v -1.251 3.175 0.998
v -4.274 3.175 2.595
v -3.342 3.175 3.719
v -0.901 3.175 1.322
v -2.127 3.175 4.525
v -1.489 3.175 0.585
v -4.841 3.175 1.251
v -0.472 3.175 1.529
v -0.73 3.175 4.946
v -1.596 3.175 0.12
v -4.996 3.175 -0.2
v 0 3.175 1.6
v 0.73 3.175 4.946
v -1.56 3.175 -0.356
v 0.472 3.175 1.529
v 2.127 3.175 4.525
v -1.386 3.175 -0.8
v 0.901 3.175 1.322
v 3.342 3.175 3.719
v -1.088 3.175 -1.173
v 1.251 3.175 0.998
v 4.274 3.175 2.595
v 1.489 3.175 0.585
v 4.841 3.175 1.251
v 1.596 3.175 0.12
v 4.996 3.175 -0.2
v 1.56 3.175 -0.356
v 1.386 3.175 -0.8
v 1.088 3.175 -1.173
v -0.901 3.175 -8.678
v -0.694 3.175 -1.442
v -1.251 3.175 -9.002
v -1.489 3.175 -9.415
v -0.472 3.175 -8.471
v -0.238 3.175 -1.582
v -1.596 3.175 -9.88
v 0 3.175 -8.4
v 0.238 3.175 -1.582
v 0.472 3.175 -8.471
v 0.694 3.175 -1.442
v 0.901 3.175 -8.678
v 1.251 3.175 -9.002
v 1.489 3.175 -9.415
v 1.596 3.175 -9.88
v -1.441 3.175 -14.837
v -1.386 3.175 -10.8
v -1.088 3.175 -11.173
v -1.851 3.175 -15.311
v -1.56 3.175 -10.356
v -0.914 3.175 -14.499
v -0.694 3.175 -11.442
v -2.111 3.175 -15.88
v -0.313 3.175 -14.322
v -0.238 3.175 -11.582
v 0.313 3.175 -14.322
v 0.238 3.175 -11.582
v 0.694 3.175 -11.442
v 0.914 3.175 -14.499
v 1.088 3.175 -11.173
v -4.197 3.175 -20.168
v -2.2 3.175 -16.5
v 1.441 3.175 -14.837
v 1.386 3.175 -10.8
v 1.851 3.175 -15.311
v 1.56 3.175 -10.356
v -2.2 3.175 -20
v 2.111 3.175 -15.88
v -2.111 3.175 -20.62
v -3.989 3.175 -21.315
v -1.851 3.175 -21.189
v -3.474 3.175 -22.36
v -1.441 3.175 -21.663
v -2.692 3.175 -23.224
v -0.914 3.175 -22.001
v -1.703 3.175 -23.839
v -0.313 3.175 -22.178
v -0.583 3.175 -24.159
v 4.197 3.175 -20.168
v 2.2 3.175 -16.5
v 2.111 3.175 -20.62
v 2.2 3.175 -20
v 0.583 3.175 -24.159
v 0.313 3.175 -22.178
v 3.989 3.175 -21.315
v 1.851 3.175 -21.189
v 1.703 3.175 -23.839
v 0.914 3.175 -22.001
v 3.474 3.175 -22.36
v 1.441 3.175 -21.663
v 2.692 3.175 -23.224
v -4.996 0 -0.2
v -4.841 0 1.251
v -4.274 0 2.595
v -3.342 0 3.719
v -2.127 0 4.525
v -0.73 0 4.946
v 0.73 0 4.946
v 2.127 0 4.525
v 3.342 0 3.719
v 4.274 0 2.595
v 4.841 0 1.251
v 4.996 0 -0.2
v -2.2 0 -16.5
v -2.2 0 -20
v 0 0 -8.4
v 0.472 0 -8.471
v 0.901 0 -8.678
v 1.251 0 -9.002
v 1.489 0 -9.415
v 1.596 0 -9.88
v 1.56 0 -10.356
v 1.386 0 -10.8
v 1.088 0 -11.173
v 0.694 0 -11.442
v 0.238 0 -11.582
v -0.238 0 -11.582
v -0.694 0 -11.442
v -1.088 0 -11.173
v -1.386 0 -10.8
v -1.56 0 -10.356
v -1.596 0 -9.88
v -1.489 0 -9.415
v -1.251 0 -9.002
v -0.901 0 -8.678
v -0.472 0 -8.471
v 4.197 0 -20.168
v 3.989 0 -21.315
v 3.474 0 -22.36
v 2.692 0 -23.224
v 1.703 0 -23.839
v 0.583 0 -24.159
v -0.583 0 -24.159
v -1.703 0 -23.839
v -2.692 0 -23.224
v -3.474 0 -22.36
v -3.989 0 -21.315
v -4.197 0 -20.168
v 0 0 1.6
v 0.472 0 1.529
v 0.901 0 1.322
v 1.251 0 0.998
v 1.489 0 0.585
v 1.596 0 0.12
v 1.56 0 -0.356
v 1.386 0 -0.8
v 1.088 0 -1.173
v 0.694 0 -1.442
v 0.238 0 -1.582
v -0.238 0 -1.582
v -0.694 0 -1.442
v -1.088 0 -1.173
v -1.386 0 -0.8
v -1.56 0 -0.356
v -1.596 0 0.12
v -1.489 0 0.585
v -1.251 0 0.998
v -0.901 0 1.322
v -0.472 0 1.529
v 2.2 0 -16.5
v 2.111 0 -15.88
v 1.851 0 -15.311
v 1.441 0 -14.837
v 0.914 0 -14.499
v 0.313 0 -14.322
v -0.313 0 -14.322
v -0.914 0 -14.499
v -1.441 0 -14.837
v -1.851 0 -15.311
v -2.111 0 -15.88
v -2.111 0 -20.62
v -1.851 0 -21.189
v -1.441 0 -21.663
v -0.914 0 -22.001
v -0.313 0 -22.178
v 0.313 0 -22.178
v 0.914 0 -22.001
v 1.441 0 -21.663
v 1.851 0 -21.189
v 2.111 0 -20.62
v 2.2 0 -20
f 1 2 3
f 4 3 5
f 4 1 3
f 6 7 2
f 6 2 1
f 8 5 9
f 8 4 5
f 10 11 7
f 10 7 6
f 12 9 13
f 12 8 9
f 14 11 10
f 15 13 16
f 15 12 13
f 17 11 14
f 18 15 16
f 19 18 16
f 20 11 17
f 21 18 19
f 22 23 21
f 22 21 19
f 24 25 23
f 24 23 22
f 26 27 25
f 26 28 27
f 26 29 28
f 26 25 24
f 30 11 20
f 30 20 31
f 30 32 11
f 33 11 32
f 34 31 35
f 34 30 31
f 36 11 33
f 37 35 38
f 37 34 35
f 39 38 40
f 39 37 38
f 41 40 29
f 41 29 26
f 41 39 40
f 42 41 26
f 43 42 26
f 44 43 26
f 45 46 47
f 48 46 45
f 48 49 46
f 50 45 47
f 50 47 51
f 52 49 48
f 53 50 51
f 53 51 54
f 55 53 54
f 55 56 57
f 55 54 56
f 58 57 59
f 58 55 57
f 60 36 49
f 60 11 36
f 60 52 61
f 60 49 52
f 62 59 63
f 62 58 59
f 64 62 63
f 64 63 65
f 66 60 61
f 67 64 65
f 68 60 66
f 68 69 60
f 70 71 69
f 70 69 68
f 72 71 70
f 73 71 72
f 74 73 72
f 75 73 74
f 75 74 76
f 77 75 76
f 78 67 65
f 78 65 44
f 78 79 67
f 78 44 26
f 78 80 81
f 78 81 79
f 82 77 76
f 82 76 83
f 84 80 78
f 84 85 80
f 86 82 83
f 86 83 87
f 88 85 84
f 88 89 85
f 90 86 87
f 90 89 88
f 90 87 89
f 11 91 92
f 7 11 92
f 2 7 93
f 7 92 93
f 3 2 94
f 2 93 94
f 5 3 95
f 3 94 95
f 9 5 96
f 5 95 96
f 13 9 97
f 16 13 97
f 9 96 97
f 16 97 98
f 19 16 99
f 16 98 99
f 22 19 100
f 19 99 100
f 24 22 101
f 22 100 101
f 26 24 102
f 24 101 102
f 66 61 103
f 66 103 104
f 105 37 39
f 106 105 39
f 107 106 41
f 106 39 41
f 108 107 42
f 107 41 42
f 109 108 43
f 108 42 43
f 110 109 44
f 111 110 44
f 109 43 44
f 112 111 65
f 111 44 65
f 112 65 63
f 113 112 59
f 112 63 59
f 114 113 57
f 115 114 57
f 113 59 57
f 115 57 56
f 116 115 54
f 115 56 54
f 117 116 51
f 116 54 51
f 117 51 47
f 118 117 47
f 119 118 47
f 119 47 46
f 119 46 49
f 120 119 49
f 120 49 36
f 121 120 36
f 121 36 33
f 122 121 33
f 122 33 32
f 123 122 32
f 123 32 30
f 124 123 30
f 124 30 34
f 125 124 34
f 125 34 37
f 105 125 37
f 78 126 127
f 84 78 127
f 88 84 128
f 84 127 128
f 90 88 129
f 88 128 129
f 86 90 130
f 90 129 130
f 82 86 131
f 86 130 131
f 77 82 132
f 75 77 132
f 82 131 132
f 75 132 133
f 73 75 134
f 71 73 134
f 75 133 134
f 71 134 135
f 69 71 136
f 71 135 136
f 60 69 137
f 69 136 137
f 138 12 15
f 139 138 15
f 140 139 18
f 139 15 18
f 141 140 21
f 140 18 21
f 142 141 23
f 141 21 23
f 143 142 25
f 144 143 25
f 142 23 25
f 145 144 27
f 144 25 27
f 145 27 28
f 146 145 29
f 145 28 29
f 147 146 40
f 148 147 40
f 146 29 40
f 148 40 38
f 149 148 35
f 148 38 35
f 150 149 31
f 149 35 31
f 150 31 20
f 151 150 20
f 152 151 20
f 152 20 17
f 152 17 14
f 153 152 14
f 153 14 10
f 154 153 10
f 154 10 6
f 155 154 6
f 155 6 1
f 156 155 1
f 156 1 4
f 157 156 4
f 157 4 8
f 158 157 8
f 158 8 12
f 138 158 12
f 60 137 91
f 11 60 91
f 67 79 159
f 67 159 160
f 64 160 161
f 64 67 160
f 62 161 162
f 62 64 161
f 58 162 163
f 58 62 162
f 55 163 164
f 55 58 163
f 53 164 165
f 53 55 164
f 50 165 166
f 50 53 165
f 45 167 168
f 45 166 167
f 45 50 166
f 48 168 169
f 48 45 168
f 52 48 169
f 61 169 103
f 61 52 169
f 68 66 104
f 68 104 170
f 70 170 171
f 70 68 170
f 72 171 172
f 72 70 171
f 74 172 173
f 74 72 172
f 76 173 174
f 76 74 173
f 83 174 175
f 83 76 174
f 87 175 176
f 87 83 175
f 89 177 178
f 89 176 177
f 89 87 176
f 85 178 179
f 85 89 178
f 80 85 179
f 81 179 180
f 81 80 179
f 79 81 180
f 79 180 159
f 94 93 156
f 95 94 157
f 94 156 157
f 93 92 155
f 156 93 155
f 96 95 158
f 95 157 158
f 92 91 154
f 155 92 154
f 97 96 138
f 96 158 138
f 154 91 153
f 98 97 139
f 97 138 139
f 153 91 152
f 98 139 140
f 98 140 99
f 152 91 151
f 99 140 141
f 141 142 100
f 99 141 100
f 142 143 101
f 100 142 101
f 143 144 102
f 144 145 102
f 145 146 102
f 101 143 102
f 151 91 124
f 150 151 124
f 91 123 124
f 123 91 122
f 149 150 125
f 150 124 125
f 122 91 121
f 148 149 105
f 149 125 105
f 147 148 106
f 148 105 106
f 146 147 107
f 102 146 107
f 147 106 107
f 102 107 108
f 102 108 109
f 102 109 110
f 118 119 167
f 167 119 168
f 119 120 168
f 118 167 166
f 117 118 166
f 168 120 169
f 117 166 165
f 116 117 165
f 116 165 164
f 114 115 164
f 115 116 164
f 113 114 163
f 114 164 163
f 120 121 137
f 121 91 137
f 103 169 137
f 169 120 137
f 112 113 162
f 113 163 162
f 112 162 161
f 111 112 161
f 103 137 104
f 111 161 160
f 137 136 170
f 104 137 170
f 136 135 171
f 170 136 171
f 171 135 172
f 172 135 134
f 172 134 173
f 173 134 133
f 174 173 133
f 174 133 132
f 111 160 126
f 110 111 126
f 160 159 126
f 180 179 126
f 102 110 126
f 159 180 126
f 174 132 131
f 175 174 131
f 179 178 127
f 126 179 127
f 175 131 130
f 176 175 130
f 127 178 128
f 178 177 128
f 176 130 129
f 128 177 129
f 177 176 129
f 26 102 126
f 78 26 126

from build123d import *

# Parameters (mm, degrees)
BOSS_EXTRUDE1_DEPTH = 3.175
SKETCH2_R           = 1.6
CUT_EXTRUDE1_DEPTH  = 25.914265492
CUT_EXTRUDE2_DEPTH  = 25.914265492


with BuildPart() as part:
    # Sketch1 → Boss-Extrude1 (new body)
    with BuildSketch(Plane(origin=(0, 0, 0), x_dir=(1, 0, 0), z_dir=(0, 1, 0))):
        with BuildLine():
            Line((-4.196638655, 20.168), (-4.995998399, 0.2))
            ThreePointArc((-4.995998399, 0.2), (0, -5), (4.995998399, 0.2))
            Line((4.995998399, 0.2), (4.196638655, 20.168))
            ThreePointArc((4.196638655, 20.168), (0, 24.2), (-4.196638655, 20.168))
        make_face()
    extrude(amount=BOSS_EXTRUDE1_DEPTH)

    # Sketch2 → Cut-Extrude1 (cut, through all)
    with BuildSketch(Plane(origin=(0, 3.175, 0), x_dir=(1, 0, 0), z_dir=(0, 1, 0))):
        with Locations(Location((0, 0, 0), (0, 0, 270))):
            Circle(SKETCH2_R)
        with Locations(Location((0, 10, 0), (0, 0, 270))):
            Circle(SKETCH2_R)
    extrude(amount=-CUT_EXTRUDE1_DEPTH, mode=Mode.SUBTRACT)

    # Sketch3 → Cut-Extrude2 (cut, through all)
    with BuildSketch(Plane(origin=(0, 3.175, 0), x_dir=(1, 0, 0), z_dir=(0, 1, 0))):
        with BuildLine():
            Line((-2.2, 16.5), (-2.2, 20))
            ThreePointArc((-2.2, 20), (0, 22.2), (2.2, 20))
            Line((2.2, 20), (2.2, 16.5))
            ThreePointArc((2.2, 16.5), (0, 14.3), (-2.2, 16.5))
        make_face()
    extrude(amount=-CUT_EXTRUDE2_DEPTH, mode=Mode.SUBTRACT)


solid = part.part
